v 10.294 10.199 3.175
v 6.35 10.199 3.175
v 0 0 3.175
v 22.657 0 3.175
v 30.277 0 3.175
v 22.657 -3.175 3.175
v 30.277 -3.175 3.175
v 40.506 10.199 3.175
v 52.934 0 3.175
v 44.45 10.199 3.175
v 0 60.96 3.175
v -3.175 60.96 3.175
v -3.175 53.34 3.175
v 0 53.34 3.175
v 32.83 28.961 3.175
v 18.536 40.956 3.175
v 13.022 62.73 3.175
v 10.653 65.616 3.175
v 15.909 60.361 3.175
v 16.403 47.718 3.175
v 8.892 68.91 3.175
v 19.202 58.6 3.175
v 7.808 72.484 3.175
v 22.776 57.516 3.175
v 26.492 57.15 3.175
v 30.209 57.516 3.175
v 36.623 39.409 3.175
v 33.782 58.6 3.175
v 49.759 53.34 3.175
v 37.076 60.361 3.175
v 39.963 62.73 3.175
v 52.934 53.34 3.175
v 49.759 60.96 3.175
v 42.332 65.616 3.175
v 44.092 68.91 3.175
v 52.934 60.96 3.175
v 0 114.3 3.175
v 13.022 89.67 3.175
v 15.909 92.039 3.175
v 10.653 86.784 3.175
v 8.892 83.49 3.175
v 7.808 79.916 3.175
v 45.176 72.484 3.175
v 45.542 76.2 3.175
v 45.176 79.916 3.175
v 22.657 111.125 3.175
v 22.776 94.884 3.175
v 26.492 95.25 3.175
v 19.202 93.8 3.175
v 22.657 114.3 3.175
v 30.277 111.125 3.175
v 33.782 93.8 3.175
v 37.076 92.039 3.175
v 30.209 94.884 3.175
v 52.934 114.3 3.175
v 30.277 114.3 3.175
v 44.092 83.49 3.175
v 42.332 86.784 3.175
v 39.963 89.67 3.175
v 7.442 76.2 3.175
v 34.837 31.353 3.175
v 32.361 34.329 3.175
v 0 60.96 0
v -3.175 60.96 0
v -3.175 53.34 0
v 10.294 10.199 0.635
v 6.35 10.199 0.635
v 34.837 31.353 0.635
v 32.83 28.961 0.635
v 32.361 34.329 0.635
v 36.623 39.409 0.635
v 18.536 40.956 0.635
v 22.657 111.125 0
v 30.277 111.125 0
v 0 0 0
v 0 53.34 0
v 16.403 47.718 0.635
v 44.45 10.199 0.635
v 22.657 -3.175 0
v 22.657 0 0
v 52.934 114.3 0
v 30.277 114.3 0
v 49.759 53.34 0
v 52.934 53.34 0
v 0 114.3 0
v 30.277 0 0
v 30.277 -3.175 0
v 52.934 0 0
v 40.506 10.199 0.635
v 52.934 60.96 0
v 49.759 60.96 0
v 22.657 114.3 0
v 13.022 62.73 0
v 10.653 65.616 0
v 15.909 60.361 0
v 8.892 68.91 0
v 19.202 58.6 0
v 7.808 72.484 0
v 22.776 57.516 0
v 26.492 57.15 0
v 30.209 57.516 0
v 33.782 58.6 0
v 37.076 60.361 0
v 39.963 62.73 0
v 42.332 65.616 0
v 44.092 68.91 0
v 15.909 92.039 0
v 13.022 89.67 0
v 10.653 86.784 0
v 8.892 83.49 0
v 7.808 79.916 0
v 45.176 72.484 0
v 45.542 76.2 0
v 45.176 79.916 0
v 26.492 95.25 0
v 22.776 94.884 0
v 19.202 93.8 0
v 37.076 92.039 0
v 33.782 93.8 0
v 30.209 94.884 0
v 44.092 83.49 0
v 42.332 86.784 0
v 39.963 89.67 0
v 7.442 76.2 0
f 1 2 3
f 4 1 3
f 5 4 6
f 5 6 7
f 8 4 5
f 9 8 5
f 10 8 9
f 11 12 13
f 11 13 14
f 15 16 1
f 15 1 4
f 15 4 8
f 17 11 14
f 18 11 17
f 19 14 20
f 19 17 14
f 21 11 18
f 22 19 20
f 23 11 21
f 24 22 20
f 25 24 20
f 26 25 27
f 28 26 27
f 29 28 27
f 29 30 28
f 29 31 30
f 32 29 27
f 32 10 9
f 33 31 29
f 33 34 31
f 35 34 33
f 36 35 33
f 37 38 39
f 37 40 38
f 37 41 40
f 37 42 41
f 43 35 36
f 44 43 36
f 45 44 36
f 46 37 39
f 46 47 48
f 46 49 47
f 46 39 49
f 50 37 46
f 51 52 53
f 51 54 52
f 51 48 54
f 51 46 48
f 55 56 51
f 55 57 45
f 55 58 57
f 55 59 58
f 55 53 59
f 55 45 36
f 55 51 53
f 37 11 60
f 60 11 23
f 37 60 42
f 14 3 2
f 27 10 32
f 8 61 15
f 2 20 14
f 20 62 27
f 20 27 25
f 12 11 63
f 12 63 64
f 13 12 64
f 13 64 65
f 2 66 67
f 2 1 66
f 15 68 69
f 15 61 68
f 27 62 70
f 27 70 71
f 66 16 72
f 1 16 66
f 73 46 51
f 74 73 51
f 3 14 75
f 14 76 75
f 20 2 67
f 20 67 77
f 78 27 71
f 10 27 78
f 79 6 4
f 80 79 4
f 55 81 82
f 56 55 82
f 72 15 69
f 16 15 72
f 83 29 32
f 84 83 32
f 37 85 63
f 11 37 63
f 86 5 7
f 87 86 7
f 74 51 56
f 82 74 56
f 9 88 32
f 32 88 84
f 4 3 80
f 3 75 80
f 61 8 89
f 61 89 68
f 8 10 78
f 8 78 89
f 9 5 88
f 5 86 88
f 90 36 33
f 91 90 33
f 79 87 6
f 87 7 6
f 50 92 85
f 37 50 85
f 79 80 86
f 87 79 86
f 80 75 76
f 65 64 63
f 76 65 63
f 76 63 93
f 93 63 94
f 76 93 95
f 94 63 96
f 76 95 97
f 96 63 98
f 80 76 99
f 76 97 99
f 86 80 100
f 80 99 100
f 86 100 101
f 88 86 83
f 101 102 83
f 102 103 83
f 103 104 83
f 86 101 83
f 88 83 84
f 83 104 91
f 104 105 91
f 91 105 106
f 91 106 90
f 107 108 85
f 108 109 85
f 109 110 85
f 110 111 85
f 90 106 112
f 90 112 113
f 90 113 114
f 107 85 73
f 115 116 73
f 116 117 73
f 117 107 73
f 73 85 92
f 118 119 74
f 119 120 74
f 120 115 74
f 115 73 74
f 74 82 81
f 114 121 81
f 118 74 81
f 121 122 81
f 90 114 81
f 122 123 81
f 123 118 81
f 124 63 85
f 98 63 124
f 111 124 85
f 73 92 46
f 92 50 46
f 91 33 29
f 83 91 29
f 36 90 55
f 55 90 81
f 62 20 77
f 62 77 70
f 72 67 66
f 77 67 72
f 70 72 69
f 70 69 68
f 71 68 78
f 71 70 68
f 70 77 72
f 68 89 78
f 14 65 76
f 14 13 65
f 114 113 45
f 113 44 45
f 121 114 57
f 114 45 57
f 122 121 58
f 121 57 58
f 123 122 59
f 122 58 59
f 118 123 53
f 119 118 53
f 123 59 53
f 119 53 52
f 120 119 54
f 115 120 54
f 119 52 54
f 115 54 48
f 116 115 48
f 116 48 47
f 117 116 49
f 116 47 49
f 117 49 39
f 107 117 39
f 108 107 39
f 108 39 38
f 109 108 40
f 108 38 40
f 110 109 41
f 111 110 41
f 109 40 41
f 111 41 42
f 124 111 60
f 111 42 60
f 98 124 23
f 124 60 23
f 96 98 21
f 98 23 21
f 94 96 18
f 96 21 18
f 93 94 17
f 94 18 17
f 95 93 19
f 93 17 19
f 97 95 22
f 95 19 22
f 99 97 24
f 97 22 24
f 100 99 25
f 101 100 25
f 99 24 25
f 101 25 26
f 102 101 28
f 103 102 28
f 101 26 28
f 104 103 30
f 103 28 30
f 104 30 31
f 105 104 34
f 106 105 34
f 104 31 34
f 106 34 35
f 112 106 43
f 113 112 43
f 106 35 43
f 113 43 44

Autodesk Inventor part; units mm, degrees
ref_plane "YZ Plane" through (0, 0, 0) normal (1, 0, 0) x (0, 1, 0)
ref_plane "XZ Plane" through (0, 0, 0) normal (0, 1, 0) x (-1, 0, 0)
ref_plane "XY Plane" through (0, 0, 0) normal (0, 0, 1) x (1, 0, 0)
sketch "Sketch1" plane through (0, 0, 0) normal (0, 0, 1) x (1, 0, 0)
  line L0 (0, 0) -> (52.9336, 0)
  line L1 (52.9336, 0) -> (52.9336, 114.3)
  line L2 (52.9336, 114.3) -> (0, 114.3)
  line L3 (0, 114.3) -> (0, 0)
  dimension "d0" = 114.3
  dimension "d1" = 52.9336
extrude "Extrusion1" add sketch "Sketch1" along normal blind 3.175
sketch "Sketch2" plane through (0, 0, 3.175) normal (0, 0, 1) x (1, 0, 0)
  line L0 (0, 114.3) -> (0, 0) projected
  line L1 (52.9336, 0) -> (52.9336, 114.3) projected
  line L2 (0, 60.96) -> (-3.175, 60.96)
  line L3 (-3.175, 60.96) -> (-3.175, 53.34)
  line L4 (-3.175, 53.34) -> (0, 53.34)
  line L5 (0, 53.34) -> (0, 60.96)
  line L6 (52.9336, 60.96) -> (49.7586, 60.96)
  line L7 (49.7586, 60.96) -> (49.7586, 53.34)
  line L8 (49.7586, 53.34) -> (52.9336, 53.34)
  line L9 (52.9336, 53.34) -> (52.9336, 60.96)
  line L10 (52.9336, 114.3) -> (0, 114.3) projected
  line L11 (0, 0) -> (52.9336, 0) projected
  line L12 (30.2768, 114.3) -> (22.6568, 114.3)
  line L13 (30.2768, 0) -> (30.2768, -3.175)
  line L14 (30.2768, -3.175) -> (22.6568, -3.175)
  line L15 (22.6568, -3.175) -> (22.6568, 0)
  line L16 (22.6568, 0) -> (30.2768, 0)
  line L17 (22.6568, 114.3) -> (22.6568, 111.125)
  line L18 (22.6568, 111.125) -> (30.2768, 111.125)
  line L19 (30.2768, 111.125) -> (30.2768, 114.3)
  point P0 (0, 57.15)
  point P1 (52.9336, 57.15)
  point P2 (26.4668, 114.3)
  point P3 (26.4668, 0)
  dimension "d4" = 3.81
  dimension "d5" = 7.62
  dimension "d6" = 3.175
  dimension "d7" = 3.81
  dimension "d8" = 7.62
  dimension "d9" = 3.175
  dimension "d13" = 7.62
  dimension "d14" = 3.81
  dimension "d15" = 3.175
  dimension "d20" = 7.62
  dimension "d21" = 3.81
  dimension "d22" = 3.175
extrude "Extrusion2" add sketch "Sketch2" against normal blind 3.175 contours L0 L4 L3 L2 | L10 L19 L18 L17 | L11 L13 L14 L15 | L1 L8 L7 L6
extrude "Extrusion3" cut sketch "Sketch2" against normal blind 3.175 contours L10 L19 L18 L17 | L1 L8 L7 L6
sketch "Sketch3" plane through (0, 0, 3.175) normal (0, 0, 1) x (1, 0, 0)
  line L0 (0, 60.96) -> (0, 114.3)
  line L1 (22.6568, 114.3) -> (0, 114.3) projected
  line L2 (0, 114.3) -> (22.6568, 114.3)
  line L3 (22.6568, 114.3) -> (22.6568, 111.125)
  line L4 (22.6568, 111.125) -> (30.2768, 111.125)
  line L5 (30.2768, 111.125) -> (22.6568, 111.125) projected
  line L6 (30.2768, 111.125) -> (30.2768, 114.3)
  line L7 (30.2768, 114.3) -> (52.9336, 114.3)
  line L8 (52.9336, 114.3) -> (52.9336, 60.96)
  line L9 (52.9336, 60.96) -> (52.9336, 114.3) projected
  line L10 (52.9336, 60.96) -> (49.7586, 60.96)
  line L11 (49.7586, 60.96) -> (49.7586, 53.34)
  line L12 (49.7586, 60.96) -> (49.7586, 53.34) projected
  line L13 (49.7586, 53.34) -> (52.9336, 53.34)
  line L14 (52.9336, 53.34) -> (52.9336, 0)
  line L15 (52.9336, 0) -> (52.9336, 53.34) projected
  line L16 (52.9336, 0) -> (30.2768, 0)
  line L17 (0, 0) -> (22.6568, 0) projected
  line L18 (30.2768, 0) -> (30.2768, -3.175)
  line L19 (30.2768, -3.175) -> (22.6568, -3.175)
  line L20 (22.6568, -3.175) -> (30.2768, -3.175) projected
  line L21 (22.6568, -3.175) -> (22.6568, 0)
  line L22 (22.6568, 0) -> (0, 0)
  line L23 (0, 0) -> (0, 53.34)
  line L24 (0, 53.34) -> (0, 0) projected
  line L25 (0, 53.34) -> (-3.175, 53.34)
  line L26 (-3.175, 53.34) -> (-3.175, 60.96)
  line L27 (-3.175, 60.96) -> (-3.175, 53.34) projected
  line L28 (-3.175, 60.96) -> (0, 60.96)
sketch "Sketch4" plane through (0, 0, 3.175) normal (0, 0, 1) x (1, 0, 0)
  circle A0 centre (26.4922, 76.2) radius 19.05
  line L0 (30.2768, 0) -> (52.9336, 0) projected
  line L1 (52.9336, 60.96) -> (52.9336, 114.3) projected
  point P0 (0, 0)
  dimension "d23" = 38.1
  dimension "d24" = 76.2
  dimension "d25" = 26.4414
sketch "Sketch5" plane through (0, 0, 3.175) normal (0, 0, 1) x (1, 0, 0)
  line L0 (6.35, 10.1986) -> (16.4034, 47.7183)
  line L1 (16.4034, 47.7183) -> (32.3606, 34.3286)
  line L2 (32.3606, 34.3286) -> (36.6232, 39.4086)
  line L3 (36.6232, 39.4086) -> (44.45, 10.1986)
  line L4 (44.45, 10.1986) -> (40.5056, 10.1986)
  line L5 (40.5056, 10.1986) -> (34.8373, 31.3529)
  line L6 (34.8373, 31.3529) -> (32.8302, 28.9609)
  line L7 (32.8302, 28.9609) -> (18.5357, 40.9555)
  line L8 (18.5357, 40.9555) -> (10.2944, 10.1986)
  line L9 (10.2944, 10.1986) -> (6.35, 10.1986)
  line L10 (0, 53.34) -> (0, 0) projected
  dimension "d26" = 3.81
  dimension "d27" = 3.81
  dimension "d29" = 3.81
  dimension "d31" = 75
  dimension "d32" = 38.1
  dimension "d33" = 6.35
  dimension "d34" = 75
  dimension "d35" = 3.81
  dimension "d36" = 29.21
  dimension "d38" = 65
  dimension "d39" = 5.08
extrude "Extrusion4" cut sketch "Sketch4" against normal blind 25.4
extrude "Extrusion5" cut sketch "Sketch5" against normal blind 2.54
properties part number "Birdhouse Tree Wall" material "Wood (Birch)"
